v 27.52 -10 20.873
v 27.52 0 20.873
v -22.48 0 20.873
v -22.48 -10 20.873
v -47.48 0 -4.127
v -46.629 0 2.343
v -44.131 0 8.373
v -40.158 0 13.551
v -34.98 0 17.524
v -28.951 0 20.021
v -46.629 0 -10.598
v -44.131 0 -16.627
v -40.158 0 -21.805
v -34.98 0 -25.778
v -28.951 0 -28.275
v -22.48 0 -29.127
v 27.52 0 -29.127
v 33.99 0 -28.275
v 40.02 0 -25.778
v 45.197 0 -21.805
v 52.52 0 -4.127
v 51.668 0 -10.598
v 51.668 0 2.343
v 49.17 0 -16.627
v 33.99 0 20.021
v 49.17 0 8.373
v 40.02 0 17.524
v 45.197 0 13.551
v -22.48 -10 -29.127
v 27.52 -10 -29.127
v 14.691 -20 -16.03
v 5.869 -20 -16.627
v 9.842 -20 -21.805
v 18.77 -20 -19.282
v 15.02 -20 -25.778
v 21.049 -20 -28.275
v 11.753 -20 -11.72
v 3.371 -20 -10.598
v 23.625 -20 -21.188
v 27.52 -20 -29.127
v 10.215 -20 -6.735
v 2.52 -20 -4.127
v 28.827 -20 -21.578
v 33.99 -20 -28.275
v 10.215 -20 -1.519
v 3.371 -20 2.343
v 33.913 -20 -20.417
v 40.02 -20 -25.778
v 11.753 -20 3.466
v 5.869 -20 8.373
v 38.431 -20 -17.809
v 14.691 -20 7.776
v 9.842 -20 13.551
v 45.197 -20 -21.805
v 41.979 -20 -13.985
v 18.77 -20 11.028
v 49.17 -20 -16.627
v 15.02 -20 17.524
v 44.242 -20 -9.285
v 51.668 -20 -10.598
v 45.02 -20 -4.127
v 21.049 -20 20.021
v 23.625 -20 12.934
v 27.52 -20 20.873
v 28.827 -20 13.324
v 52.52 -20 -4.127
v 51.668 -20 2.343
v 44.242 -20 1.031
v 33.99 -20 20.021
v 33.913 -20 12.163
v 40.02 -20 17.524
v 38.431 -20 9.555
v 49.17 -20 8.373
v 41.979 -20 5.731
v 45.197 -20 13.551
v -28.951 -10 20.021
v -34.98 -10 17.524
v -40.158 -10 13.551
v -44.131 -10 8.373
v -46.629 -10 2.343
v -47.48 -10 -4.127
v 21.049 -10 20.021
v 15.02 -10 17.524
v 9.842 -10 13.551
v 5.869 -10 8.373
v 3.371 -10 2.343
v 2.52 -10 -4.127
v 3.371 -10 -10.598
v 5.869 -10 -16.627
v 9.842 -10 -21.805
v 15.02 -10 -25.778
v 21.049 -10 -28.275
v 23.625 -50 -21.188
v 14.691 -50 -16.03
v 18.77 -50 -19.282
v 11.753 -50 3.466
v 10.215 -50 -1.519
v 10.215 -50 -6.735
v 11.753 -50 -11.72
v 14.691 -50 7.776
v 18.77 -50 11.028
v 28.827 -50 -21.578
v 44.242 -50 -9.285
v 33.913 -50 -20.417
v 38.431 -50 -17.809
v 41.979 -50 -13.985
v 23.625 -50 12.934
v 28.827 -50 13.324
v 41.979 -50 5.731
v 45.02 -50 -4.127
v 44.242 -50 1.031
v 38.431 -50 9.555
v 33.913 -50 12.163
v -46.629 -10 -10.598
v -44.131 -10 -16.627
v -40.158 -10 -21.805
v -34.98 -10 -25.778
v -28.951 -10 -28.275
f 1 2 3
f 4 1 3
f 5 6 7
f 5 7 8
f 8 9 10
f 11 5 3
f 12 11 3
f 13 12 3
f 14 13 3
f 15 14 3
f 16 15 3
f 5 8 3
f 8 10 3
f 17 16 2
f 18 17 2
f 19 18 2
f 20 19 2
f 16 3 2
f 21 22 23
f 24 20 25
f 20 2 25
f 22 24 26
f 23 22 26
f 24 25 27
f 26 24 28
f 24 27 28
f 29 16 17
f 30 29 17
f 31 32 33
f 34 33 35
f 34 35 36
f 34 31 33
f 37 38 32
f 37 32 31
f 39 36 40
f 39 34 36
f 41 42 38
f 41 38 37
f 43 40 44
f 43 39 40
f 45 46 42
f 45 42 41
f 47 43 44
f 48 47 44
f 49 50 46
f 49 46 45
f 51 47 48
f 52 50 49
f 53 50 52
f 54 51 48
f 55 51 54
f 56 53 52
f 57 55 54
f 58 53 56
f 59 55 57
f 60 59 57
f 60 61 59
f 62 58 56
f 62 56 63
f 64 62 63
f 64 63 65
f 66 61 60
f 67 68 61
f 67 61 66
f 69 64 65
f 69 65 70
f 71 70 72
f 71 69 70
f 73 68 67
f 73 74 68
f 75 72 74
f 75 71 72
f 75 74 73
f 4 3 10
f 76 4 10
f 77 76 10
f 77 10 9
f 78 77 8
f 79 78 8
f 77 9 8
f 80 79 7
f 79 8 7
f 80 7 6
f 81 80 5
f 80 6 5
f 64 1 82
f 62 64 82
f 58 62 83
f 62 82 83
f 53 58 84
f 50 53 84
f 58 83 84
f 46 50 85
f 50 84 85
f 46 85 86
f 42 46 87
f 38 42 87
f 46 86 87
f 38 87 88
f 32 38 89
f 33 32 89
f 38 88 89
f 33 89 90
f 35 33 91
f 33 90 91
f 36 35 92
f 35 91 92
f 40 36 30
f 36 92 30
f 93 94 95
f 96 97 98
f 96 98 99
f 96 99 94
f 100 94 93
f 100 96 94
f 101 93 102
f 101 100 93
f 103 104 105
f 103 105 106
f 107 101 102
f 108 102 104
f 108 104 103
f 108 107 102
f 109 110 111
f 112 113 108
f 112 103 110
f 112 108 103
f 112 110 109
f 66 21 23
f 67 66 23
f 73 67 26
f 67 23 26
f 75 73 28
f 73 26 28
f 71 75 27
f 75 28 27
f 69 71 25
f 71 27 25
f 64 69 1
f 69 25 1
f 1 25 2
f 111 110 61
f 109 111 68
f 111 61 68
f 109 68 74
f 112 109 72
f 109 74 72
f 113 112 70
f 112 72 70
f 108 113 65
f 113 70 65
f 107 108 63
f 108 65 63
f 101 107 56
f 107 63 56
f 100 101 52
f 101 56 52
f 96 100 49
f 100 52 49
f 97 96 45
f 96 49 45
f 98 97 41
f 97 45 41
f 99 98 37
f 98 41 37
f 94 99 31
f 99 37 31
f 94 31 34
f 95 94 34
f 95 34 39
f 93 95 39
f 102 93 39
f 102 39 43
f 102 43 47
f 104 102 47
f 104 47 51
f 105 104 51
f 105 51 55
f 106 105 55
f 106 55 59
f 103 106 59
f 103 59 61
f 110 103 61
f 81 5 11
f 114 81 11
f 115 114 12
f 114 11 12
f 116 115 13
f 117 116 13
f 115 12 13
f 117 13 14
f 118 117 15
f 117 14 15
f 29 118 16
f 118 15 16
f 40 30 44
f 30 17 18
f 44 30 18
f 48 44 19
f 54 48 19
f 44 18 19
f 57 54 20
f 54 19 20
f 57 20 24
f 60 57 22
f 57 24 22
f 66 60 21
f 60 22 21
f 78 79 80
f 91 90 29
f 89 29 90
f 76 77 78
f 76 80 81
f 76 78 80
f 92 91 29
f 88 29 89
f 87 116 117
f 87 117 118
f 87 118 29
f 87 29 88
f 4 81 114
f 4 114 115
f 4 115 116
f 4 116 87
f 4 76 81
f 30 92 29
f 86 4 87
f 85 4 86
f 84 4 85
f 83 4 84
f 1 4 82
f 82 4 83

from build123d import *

# Parameters (mm, degrees)
F1_DEPTH = 10
F0_R     = 17.5
F2_DEPTH = 50
F3_DEPTH = 20


with BuildPart() as f1:
    # F0 (on Front) → F1 (new body)
    with BuildSketch(Plane.XZ):
        with BuildLine():
            Line((27.51959, 20.872951), (-22.48041, 20.872951))
            ThreePointArc((-22.48041, 20.872951), (-40.15808, 13.550621), (-47.48041, -4.127049))
            ThreePointArc((-47.48041, -4.127049), (-40.15808, -21.804718), (-22.48041, -29.127049))
            Line((-22.48041, -29.127049), (27.51959, -29.127049))
            ThreePointArc((27.51959, -29.127049), (2.51959, -4.127049), (27.51959, 20.872951))
        make_face()
    extrude(amount=F1_DEPTH)



with BuildPart() as f2:
    # F0 (on Front) → F2 (new body)
    with BuildSketch(Plane.XZ):
        with Locations((27.51959, -4.127049)):
            Circle(F0_R)
    extrude(amount=F2_DEPTH)


with BuildPart() as f1_1:
    add(f1.part)

    add(f2.part)  # F3 merges F2
    # F0 (on Front) → F3 (join)
    with BuildSketch(Plane.XZ):
        with BuildLine():
            ThreePointArc((52.51959, -4.127049), (45.197259, 13.550621), (27.51959, 20.872951))
            ThreePointArc((27.51959, 20.872951), (2.51959, -4.127049), (27.51959, -29.127049))
            ThreePointArc((27.51959, -29.127049), (45.197259, -21.804718), (52.51959, -4.127049))
        make_face()
        with Locations((27.51959, -4.127049)):
            Circle(F0_R, mode=Mode.SUBTRACT)
    extrude(amount=F3_DEPTH)


solid = f1_1.part
